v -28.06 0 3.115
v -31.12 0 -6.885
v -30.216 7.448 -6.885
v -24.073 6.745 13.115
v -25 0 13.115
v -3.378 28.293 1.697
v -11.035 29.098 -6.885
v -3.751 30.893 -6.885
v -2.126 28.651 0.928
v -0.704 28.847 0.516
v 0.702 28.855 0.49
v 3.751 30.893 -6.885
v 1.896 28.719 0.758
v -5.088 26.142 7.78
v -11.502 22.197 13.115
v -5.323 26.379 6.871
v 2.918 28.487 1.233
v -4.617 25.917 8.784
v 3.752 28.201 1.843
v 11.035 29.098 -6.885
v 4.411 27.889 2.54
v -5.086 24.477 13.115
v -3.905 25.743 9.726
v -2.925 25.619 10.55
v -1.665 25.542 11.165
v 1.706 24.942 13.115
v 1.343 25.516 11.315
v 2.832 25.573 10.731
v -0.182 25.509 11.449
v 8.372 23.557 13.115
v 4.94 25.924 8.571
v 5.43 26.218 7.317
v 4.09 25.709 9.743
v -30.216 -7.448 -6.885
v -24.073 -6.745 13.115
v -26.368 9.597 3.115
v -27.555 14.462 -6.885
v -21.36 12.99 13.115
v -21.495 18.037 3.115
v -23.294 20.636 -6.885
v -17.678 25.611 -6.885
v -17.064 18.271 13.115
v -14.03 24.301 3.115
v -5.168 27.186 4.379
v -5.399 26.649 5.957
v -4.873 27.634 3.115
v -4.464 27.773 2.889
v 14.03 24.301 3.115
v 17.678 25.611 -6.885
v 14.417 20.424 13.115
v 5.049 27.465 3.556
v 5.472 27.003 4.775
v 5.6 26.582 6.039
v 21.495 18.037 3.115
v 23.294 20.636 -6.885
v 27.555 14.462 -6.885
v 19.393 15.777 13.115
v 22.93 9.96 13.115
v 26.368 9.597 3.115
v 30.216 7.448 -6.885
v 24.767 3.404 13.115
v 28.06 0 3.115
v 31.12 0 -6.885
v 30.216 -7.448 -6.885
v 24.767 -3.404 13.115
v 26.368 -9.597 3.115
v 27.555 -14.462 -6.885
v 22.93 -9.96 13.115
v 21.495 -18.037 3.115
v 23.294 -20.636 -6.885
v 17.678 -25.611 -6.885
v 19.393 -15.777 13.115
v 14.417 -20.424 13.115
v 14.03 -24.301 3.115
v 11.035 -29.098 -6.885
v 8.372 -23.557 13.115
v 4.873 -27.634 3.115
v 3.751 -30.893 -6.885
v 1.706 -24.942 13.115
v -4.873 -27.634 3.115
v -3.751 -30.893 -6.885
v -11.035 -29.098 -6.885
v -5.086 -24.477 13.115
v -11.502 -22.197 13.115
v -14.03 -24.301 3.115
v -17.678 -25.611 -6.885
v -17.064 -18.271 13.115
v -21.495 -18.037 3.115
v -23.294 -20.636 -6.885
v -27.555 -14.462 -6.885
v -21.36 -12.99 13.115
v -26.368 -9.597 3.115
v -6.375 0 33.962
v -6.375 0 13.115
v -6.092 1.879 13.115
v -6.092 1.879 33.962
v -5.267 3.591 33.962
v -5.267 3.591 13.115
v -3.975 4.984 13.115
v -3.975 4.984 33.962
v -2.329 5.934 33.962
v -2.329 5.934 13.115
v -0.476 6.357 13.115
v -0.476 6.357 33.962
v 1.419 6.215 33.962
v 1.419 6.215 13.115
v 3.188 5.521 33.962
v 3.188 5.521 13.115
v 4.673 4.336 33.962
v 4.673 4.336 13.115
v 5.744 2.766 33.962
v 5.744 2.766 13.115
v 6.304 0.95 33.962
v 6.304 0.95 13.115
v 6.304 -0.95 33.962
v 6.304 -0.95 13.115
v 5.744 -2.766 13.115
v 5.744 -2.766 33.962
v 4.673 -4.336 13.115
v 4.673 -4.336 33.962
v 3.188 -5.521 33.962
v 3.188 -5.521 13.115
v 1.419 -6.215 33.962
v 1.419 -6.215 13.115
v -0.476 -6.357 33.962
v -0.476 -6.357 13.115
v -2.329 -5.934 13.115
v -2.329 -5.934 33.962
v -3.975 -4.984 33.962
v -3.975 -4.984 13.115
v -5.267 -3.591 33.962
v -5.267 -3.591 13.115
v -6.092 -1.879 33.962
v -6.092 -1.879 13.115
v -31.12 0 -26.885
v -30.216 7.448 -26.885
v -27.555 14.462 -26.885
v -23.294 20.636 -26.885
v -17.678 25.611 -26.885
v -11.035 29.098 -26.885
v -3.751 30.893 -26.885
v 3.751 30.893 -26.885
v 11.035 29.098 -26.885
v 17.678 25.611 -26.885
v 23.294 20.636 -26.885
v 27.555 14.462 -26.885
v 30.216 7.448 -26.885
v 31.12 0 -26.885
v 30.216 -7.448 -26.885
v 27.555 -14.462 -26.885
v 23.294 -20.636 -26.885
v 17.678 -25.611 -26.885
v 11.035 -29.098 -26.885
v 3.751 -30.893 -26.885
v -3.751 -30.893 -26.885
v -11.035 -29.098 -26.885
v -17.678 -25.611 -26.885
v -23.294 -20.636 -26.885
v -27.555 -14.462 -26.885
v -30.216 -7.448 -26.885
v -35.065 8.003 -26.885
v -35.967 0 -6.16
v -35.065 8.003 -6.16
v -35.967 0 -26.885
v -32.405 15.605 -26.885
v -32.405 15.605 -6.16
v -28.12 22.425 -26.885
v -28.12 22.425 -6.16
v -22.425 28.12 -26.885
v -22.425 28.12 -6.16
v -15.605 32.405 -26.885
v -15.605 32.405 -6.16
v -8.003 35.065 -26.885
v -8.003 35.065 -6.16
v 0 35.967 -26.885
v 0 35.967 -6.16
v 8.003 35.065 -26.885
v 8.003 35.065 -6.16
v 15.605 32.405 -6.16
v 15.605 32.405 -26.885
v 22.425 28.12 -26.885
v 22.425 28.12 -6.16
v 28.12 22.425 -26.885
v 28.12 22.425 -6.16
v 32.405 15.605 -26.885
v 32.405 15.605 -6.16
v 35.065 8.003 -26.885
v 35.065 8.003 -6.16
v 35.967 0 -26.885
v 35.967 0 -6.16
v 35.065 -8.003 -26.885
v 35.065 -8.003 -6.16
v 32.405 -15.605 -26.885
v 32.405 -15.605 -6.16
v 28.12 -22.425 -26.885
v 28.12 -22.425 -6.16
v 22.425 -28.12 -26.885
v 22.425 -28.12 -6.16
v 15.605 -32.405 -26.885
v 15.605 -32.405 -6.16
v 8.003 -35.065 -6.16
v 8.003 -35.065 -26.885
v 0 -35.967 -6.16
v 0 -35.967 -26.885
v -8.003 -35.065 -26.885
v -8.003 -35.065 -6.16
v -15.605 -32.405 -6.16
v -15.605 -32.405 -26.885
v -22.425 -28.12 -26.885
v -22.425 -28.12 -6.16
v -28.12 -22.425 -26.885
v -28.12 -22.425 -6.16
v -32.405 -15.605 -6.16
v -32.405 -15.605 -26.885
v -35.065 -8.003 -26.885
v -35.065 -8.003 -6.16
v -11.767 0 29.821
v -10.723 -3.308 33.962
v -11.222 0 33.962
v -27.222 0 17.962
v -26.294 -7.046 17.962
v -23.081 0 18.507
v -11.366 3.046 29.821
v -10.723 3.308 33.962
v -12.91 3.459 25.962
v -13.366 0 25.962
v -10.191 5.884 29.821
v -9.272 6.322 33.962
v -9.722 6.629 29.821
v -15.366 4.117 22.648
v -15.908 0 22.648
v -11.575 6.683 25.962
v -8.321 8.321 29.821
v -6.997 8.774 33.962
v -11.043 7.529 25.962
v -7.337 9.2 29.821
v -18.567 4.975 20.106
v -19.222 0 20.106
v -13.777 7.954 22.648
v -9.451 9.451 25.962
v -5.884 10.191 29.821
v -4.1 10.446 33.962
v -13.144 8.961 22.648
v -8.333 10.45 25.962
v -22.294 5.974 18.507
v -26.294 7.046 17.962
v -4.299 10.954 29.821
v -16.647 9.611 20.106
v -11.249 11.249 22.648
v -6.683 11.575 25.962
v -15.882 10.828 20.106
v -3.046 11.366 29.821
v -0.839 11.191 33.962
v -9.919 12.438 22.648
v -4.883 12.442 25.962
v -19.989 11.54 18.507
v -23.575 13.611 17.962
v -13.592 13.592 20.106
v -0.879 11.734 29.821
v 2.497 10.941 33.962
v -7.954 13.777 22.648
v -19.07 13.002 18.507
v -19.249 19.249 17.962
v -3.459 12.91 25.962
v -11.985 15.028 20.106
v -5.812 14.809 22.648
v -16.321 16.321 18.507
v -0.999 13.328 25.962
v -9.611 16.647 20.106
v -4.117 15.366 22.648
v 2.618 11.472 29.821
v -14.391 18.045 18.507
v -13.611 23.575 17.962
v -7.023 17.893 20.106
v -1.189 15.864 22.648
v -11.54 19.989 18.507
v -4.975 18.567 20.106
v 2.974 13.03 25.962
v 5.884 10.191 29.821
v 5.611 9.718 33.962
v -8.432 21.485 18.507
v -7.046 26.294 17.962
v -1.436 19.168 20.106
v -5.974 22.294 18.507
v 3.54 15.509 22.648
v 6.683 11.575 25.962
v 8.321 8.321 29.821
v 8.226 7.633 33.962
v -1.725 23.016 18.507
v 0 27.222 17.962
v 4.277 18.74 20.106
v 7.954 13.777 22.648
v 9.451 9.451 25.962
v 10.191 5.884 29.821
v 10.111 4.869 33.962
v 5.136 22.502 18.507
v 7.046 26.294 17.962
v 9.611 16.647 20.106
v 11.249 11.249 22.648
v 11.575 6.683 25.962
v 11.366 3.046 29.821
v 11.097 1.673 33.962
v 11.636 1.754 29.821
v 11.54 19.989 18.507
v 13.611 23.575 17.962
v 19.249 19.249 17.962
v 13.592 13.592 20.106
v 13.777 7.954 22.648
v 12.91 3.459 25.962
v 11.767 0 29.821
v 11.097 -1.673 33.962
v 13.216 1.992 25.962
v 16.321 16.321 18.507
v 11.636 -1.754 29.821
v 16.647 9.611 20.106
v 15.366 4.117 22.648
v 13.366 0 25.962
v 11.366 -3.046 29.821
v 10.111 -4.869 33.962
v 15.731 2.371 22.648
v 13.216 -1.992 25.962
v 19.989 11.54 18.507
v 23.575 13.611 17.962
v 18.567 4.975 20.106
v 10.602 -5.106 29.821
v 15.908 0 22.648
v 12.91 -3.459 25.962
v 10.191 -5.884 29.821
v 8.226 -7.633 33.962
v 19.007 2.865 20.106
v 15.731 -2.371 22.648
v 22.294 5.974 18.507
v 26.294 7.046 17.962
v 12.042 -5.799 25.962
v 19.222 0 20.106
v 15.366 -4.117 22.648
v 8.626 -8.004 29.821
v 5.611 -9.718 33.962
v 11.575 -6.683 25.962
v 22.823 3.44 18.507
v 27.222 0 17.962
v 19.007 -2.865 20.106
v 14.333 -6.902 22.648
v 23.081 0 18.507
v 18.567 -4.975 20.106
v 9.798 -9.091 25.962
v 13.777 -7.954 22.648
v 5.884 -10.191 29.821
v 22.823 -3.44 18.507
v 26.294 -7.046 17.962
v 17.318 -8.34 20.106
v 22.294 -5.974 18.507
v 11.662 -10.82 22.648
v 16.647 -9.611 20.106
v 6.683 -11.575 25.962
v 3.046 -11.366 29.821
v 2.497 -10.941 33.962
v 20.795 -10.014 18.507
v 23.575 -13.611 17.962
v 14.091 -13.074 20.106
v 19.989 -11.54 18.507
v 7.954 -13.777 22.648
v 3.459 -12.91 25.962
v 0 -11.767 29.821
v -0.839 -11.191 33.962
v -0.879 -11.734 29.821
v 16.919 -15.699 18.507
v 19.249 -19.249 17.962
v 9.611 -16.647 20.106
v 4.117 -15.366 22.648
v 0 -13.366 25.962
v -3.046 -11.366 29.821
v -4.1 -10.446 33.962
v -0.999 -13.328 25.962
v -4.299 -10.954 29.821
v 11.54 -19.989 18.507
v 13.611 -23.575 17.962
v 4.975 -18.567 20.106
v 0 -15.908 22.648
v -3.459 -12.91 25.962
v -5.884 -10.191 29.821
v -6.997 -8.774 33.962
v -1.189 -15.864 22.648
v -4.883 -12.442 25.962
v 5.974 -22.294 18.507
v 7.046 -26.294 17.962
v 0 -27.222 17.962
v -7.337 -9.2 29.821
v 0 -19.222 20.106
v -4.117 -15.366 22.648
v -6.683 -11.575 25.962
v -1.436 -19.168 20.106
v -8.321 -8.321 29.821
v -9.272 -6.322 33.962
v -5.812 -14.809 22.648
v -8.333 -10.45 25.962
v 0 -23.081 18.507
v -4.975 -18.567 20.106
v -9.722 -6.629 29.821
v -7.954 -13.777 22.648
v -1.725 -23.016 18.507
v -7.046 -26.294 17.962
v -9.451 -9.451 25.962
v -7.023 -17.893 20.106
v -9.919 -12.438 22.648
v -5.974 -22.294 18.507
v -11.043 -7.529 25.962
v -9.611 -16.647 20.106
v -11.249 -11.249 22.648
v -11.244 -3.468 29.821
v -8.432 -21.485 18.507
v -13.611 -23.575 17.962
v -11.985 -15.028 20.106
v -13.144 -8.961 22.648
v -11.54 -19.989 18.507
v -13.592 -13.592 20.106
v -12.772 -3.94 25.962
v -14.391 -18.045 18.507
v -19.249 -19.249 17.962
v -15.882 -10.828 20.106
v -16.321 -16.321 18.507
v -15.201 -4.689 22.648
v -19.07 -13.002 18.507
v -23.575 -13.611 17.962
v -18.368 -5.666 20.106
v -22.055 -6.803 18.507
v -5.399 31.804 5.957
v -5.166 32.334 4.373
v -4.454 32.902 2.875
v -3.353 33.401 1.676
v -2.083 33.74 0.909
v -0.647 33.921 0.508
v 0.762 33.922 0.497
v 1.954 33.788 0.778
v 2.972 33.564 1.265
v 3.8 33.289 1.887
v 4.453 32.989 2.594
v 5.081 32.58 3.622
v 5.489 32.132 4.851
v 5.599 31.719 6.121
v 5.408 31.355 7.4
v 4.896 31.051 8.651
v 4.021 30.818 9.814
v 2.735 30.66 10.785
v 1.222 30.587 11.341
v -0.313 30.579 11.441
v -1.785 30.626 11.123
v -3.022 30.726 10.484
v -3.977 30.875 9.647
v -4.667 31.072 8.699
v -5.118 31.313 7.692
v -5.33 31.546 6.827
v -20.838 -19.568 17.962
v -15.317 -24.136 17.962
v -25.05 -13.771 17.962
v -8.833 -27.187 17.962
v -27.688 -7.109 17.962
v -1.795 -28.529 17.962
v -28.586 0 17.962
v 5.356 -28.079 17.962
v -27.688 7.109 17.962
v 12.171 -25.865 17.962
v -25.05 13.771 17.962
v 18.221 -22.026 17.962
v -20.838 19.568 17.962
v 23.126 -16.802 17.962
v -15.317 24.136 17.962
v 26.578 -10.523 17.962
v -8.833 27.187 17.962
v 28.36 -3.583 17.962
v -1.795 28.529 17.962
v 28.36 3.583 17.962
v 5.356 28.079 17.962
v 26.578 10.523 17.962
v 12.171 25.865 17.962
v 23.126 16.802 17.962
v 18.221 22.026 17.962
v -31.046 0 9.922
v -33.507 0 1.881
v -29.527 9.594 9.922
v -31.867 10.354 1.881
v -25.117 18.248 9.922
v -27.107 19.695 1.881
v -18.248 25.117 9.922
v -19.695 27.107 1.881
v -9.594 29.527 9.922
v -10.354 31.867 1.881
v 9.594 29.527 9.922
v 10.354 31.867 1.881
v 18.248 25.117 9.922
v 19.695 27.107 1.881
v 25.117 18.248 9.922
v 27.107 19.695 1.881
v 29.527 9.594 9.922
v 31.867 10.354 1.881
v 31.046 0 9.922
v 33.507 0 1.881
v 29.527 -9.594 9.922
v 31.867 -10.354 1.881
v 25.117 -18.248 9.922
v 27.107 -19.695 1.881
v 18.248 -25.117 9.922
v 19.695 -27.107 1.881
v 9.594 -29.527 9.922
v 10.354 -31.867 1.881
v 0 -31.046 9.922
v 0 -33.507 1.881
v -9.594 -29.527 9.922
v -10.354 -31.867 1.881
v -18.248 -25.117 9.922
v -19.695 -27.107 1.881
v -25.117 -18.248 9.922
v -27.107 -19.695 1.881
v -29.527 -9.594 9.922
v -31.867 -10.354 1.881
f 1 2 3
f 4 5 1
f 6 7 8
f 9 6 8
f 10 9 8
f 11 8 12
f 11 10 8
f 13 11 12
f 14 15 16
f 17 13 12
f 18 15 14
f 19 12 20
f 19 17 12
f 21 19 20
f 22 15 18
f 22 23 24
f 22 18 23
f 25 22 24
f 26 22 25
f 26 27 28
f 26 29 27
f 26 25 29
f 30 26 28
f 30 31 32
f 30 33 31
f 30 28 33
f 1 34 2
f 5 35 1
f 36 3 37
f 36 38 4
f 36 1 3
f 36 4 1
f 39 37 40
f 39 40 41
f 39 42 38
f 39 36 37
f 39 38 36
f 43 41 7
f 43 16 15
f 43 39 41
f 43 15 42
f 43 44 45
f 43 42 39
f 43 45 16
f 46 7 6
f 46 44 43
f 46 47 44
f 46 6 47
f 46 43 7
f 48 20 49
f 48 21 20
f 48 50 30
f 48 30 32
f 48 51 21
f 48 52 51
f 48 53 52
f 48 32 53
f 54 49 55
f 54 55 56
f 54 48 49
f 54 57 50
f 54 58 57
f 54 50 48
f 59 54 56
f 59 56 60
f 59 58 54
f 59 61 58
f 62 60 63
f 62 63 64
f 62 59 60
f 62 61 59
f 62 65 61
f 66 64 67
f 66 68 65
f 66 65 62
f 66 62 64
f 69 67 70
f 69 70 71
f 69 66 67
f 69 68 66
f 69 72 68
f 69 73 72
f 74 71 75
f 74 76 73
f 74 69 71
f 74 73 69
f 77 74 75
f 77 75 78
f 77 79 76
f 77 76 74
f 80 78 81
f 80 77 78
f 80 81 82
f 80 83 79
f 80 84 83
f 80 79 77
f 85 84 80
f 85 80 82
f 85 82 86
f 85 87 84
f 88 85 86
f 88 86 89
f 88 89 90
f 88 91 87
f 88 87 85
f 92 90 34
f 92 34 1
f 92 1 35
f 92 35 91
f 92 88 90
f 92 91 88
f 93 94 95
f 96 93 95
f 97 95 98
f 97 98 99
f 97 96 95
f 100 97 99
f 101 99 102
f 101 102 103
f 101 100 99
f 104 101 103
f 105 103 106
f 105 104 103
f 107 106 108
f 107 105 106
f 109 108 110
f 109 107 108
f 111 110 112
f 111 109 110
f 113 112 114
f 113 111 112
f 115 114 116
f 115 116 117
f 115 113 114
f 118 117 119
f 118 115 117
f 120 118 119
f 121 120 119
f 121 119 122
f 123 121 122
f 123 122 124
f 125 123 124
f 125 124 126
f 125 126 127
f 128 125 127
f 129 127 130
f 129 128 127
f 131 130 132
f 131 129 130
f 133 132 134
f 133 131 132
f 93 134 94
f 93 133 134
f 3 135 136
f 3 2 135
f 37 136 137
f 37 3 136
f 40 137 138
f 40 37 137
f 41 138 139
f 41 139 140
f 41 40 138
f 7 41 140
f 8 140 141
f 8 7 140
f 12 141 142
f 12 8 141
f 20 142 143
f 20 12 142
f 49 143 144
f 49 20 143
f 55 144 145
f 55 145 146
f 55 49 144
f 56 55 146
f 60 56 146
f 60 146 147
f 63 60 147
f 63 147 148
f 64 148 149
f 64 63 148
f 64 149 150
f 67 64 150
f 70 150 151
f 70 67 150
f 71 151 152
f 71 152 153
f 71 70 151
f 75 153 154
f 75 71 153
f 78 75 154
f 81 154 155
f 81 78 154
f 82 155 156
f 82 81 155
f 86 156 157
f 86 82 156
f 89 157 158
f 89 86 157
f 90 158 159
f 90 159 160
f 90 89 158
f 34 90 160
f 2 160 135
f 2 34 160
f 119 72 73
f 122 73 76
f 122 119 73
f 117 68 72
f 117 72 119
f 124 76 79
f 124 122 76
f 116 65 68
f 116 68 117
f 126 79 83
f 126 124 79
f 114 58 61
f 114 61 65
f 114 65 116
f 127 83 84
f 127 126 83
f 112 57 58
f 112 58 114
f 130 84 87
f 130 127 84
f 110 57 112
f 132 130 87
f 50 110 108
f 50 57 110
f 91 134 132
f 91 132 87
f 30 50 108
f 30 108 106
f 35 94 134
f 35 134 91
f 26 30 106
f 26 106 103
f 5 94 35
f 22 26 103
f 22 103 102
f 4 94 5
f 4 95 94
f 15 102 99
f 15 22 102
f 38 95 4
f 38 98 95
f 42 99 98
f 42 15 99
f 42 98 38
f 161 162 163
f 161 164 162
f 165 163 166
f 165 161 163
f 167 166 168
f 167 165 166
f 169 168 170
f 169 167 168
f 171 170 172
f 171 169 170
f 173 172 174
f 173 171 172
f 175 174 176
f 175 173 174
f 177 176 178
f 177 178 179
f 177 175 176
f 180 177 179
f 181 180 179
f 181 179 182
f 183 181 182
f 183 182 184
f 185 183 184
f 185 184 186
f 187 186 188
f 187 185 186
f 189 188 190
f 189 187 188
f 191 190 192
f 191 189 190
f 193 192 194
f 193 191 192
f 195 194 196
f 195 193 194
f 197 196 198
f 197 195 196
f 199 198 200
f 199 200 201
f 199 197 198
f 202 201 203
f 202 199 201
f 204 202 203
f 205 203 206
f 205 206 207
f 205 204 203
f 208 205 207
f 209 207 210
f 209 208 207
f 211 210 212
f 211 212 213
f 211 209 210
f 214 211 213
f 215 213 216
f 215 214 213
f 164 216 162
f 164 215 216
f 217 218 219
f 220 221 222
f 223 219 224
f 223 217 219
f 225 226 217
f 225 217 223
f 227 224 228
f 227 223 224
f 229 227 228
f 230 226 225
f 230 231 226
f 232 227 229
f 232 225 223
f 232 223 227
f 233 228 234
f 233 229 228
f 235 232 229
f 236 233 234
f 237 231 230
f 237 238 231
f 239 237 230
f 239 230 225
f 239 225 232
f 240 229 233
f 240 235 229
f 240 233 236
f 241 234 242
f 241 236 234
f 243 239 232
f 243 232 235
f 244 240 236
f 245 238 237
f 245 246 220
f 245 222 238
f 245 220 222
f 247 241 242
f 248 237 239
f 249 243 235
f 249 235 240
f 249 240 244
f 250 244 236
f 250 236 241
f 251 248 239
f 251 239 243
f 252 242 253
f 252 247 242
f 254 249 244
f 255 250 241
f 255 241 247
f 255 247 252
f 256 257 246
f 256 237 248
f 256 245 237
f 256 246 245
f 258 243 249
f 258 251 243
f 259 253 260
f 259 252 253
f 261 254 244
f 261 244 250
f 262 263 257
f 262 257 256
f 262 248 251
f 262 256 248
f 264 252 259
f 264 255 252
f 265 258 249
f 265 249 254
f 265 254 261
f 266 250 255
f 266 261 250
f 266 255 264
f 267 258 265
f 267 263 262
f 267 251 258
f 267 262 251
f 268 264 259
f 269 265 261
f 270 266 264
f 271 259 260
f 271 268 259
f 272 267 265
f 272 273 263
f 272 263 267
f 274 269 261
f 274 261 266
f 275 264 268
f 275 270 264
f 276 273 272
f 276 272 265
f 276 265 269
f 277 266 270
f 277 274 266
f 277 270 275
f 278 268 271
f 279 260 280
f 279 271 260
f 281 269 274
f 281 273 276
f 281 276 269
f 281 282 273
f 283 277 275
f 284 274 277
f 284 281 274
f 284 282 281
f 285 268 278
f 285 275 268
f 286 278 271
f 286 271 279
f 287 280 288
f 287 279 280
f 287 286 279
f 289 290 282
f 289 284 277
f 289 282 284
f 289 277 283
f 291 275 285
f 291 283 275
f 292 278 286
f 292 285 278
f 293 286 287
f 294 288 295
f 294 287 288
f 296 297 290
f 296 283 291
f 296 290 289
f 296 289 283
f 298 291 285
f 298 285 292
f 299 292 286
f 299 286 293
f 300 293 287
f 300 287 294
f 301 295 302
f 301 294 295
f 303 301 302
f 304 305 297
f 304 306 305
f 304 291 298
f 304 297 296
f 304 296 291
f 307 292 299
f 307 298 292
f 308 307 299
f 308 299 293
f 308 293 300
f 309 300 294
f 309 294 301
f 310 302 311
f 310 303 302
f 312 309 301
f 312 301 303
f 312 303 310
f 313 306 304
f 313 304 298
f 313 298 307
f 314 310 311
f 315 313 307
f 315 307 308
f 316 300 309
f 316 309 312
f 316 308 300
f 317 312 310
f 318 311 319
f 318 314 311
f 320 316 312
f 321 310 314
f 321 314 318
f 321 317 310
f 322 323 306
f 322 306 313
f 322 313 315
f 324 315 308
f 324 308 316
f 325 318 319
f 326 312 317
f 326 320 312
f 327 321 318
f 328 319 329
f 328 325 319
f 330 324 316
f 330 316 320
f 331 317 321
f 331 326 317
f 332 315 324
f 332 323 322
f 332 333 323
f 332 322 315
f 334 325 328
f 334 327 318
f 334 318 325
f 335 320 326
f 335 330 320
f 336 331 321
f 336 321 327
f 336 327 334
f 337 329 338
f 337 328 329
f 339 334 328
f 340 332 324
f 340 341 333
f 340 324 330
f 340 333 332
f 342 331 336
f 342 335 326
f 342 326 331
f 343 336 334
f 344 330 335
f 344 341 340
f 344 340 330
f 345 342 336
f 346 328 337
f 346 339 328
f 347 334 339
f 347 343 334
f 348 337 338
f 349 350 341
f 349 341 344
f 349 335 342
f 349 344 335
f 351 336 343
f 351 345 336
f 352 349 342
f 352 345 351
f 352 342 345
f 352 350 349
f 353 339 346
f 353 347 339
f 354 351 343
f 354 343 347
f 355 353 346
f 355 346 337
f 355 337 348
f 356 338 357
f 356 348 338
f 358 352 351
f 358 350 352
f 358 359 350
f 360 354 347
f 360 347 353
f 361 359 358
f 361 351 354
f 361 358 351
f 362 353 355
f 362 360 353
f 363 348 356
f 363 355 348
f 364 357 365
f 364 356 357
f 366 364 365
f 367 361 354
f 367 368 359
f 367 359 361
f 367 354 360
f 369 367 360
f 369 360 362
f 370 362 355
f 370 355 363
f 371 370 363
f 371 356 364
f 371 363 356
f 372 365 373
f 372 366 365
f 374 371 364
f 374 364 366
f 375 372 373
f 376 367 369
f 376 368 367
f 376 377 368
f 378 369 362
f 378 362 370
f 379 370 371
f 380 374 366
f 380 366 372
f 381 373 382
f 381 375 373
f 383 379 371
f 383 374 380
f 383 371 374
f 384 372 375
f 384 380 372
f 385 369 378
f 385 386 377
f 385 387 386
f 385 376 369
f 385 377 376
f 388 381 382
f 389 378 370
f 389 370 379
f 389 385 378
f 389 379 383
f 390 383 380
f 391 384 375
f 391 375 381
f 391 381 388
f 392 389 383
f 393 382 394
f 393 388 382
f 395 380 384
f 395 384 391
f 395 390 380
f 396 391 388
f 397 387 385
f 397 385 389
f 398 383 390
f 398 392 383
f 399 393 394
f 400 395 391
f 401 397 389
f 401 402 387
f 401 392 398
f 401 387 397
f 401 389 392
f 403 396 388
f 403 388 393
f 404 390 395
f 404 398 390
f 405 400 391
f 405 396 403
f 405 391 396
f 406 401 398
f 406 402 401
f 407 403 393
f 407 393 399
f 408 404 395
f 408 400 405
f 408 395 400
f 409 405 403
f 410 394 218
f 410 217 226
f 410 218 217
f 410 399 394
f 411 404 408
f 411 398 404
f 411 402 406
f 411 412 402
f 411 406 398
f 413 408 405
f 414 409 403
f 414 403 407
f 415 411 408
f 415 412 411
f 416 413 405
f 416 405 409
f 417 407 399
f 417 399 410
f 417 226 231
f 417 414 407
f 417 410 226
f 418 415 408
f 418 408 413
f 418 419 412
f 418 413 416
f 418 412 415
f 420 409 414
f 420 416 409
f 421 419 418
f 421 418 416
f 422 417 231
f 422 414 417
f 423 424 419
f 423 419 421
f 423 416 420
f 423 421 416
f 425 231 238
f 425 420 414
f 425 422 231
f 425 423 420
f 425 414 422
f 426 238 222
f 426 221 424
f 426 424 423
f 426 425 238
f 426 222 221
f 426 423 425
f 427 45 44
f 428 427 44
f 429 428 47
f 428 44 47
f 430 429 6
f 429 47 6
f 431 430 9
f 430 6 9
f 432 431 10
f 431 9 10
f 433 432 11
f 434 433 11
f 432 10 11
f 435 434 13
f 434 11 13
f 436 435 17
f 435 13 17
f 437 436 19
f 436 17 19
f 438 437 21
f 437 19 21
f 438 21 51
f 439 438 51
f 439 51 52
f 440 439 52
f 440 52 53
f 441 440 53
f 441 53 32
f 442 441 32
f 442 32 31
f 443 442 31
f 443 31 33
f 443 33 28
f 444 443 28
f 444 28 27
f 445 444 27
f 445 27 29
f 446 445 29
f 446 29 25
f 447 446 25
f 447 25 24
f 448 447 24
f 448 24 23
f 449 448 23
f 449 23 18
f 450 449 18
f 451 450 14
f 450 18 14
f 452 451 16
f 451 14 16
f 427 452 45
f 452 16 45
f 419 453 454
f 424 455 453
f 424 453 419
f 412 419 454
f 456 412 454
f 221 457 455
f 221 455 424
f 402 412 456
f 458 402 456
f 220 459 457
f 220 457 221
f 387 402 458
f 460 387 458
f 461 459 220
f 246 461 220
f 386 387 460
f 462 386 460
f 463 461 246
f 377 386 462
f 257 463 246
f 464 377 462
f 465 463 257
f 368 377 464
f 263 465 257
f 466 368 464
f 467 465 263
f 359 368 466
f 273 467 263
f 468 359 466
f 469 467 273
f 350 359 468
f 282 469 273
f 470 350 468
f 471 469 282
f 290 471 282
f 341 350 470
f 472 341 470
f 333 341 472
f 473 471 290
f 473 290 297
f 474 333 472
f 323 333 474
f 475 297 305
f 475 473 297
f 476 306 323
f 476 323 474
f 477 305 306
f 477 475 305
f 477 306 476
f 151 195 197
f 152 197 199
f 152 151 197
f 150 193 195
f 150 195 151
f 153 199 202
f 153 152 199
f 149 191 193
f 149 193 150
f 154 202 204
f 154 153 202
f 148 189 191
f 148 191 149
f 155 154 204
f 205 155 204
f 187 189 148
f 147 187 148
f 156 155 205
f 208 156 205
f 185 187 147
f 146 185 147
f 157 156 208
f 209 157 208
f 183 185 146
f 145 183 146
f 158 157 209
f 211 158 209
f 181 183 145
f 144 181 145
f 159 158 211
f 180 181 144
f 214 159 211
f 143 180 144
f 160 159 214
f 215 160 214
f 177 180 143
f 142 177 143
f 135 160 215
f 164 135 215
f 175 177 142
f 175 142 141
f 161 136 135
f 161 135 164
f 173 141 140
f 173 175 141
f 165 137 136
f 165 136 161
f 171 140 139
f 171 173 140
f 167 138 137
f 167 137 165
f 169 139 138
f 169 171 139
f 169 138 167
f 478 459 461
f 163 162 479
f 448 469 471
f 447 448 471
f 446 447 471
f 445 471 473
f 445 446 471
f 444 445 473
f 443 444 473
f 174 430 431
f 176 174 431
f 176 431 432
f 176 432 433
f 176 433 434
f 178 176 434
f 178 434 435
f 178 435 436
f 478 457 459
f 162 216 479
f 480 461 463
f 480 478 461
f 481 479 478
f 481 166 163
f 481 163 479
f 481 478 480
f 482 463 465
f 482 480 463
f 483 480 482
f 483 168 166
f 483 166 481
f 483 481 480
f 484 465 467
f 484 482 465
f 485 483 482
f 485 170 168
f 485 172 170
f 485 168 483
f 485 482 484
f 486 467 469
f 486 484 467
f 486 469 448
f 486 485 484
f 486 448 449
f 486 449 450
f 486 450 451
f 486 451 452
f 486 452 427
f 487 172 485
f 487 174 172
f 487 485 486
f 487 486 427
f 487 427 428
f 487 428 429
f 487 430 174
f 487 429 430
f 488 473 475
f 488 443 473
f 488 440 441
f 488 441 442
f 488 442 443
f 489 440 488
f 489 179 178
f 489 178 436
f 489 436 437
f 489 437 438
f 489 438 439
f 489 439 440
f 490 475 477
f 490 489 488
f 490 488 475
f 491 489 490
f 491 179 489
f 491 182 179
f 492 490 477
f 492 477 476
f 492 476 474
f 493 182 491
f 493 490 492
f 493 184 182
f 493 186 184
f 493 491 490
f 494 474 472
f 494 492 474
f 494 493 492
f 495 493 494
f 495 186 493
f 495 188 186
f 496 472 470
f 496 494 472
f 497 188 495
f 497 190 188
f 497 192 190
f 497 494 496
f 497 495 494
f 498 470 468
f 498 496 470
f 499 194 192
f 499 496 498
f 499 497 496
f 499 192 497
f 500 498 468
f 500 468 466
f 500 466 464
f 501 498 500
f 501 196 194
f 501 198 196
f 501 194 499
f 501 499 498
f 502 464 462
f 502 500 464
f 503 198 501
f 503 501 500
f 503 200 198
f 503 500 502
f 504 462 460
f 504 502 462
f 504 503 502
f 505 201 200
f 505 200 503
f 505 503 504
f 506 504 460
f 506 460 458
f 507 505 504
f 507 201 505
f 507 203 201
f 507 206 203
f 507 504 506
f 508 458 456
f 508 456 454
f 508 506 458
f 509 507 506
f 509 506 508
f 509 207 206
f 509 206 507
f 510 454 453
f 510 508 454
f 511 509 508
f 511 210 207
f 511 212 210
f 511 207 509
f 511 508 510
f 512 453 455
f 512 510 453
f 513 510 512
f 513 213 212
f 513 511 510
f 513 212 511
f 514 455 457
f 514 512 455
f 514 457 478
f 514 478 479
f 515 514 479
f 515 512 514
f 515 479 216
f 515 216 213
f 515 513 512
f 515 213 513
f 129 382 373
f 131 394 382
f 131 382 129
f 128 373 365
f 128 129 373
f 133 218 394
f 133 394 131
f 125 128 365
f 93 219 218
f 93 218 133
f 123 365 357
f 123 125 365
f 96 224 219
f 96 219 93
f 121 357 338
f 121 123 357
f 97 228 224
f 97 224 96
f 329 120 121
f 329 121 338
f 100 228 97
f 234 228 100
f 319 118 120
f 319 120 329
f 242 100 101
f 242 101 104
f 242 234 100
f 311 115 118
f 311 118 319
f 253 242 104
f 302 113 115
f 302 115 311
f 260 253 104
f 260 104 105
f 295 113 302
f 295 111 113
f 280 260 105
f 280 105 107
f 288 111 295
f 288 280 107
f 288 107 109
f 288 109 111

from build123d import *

# Parameters (mm, degrees)
F3_DEPTH = 35.967948
F5_COUNT = 3
F5_ANGLE = 240
F9_COUNT = 3
F9_ANGLE = 240


with BuildPart() as f1:
    # F0 (on Front) → F1 (revolve)
    with BuildSketch(Plane.XZ):
        with BuildLine():
            Line((-35.966948, -26.884749), (-31.12, -26.884749))
            Line((-31.12, -26.884749), (-31.12, -6.884749))
            Line((-31.12, -6.884749), (-25, 13.115251))
            Line((-25, 13.115251), (-6.375, 13.115251))
            Line((-6.375, 13.115251), (-6.375, 33.962199))
            Line((-6.375, 33.962199), (-11.221948, 33.962199))
            ThreePointArc((-11.221948, 33.962199), (-15.908239, 22.64849), (-27.221948, 17.962199))
            Line((-27.221948, 17.962199), (-28.585629, 17.962199))
            Line((-28.585629, 17.962199), (-35.966948, -6.159757))
            Line((-35.966948, -6.159757), (-35.966948, -26.884749))
        make_face()
    revolve(axis=Axis((0, 0, 3.115251), (0, 0, -1)))

    # F2 (on Front) → F3 (cut, through all)
    with BuildSketch(Plane.XZ):
        with BuildLine():
            ThreePointArc((5.600963, 5.956731), (0.100963, 11.456731), (-5.399037, 5.956731))
            Line((-5.399037, 5.956731), (5.600963, 5.956731))
        make_face()
        with BuildLine():
            Line((5.600963, 5.956731), (-5.399037, 5.956731))
            ThreePointArc((-5.399037, 5.956731), (0.100963, 0.456731), (5.600963, 5.956731))
        make_face()
    extrude(amount=-F3_DEPTH, mode=Mode.SUBTRACT)


with BuildPart() as f5_1:
    # F5: instance of F1
    add(f1.part.rotate(Axis((0, 0, 22.867789), (0, 0, 1)), 1 * F5_ANGLE / (F5_COUNT - 1)))


with BuildPart() as f5_2:
    # F5: instance of F1
    add(f1.part.rotate(Axis((0, 0, 22.867789), (0, 0, 1)), 2 * F5_ANGLE / (F5_COUNT - 1)))


with BuildPart() as f9_1:
    # F9: instance of F1
    add(f1.part.rotate(Axis((0, 0, 23.663558), (0, 0, 1)), 1 * F9_ANGLE / (F9_COUNT - 1)))


with BuildPart() as f9_2:
    # F9: instance of F1
    add(f1.part.rotate(Axis((0, 0, 23.663558), (0, 0, 1)), 2 * F9_ANGLE / (F9_COUNT - 1)))


solid = f1.part
